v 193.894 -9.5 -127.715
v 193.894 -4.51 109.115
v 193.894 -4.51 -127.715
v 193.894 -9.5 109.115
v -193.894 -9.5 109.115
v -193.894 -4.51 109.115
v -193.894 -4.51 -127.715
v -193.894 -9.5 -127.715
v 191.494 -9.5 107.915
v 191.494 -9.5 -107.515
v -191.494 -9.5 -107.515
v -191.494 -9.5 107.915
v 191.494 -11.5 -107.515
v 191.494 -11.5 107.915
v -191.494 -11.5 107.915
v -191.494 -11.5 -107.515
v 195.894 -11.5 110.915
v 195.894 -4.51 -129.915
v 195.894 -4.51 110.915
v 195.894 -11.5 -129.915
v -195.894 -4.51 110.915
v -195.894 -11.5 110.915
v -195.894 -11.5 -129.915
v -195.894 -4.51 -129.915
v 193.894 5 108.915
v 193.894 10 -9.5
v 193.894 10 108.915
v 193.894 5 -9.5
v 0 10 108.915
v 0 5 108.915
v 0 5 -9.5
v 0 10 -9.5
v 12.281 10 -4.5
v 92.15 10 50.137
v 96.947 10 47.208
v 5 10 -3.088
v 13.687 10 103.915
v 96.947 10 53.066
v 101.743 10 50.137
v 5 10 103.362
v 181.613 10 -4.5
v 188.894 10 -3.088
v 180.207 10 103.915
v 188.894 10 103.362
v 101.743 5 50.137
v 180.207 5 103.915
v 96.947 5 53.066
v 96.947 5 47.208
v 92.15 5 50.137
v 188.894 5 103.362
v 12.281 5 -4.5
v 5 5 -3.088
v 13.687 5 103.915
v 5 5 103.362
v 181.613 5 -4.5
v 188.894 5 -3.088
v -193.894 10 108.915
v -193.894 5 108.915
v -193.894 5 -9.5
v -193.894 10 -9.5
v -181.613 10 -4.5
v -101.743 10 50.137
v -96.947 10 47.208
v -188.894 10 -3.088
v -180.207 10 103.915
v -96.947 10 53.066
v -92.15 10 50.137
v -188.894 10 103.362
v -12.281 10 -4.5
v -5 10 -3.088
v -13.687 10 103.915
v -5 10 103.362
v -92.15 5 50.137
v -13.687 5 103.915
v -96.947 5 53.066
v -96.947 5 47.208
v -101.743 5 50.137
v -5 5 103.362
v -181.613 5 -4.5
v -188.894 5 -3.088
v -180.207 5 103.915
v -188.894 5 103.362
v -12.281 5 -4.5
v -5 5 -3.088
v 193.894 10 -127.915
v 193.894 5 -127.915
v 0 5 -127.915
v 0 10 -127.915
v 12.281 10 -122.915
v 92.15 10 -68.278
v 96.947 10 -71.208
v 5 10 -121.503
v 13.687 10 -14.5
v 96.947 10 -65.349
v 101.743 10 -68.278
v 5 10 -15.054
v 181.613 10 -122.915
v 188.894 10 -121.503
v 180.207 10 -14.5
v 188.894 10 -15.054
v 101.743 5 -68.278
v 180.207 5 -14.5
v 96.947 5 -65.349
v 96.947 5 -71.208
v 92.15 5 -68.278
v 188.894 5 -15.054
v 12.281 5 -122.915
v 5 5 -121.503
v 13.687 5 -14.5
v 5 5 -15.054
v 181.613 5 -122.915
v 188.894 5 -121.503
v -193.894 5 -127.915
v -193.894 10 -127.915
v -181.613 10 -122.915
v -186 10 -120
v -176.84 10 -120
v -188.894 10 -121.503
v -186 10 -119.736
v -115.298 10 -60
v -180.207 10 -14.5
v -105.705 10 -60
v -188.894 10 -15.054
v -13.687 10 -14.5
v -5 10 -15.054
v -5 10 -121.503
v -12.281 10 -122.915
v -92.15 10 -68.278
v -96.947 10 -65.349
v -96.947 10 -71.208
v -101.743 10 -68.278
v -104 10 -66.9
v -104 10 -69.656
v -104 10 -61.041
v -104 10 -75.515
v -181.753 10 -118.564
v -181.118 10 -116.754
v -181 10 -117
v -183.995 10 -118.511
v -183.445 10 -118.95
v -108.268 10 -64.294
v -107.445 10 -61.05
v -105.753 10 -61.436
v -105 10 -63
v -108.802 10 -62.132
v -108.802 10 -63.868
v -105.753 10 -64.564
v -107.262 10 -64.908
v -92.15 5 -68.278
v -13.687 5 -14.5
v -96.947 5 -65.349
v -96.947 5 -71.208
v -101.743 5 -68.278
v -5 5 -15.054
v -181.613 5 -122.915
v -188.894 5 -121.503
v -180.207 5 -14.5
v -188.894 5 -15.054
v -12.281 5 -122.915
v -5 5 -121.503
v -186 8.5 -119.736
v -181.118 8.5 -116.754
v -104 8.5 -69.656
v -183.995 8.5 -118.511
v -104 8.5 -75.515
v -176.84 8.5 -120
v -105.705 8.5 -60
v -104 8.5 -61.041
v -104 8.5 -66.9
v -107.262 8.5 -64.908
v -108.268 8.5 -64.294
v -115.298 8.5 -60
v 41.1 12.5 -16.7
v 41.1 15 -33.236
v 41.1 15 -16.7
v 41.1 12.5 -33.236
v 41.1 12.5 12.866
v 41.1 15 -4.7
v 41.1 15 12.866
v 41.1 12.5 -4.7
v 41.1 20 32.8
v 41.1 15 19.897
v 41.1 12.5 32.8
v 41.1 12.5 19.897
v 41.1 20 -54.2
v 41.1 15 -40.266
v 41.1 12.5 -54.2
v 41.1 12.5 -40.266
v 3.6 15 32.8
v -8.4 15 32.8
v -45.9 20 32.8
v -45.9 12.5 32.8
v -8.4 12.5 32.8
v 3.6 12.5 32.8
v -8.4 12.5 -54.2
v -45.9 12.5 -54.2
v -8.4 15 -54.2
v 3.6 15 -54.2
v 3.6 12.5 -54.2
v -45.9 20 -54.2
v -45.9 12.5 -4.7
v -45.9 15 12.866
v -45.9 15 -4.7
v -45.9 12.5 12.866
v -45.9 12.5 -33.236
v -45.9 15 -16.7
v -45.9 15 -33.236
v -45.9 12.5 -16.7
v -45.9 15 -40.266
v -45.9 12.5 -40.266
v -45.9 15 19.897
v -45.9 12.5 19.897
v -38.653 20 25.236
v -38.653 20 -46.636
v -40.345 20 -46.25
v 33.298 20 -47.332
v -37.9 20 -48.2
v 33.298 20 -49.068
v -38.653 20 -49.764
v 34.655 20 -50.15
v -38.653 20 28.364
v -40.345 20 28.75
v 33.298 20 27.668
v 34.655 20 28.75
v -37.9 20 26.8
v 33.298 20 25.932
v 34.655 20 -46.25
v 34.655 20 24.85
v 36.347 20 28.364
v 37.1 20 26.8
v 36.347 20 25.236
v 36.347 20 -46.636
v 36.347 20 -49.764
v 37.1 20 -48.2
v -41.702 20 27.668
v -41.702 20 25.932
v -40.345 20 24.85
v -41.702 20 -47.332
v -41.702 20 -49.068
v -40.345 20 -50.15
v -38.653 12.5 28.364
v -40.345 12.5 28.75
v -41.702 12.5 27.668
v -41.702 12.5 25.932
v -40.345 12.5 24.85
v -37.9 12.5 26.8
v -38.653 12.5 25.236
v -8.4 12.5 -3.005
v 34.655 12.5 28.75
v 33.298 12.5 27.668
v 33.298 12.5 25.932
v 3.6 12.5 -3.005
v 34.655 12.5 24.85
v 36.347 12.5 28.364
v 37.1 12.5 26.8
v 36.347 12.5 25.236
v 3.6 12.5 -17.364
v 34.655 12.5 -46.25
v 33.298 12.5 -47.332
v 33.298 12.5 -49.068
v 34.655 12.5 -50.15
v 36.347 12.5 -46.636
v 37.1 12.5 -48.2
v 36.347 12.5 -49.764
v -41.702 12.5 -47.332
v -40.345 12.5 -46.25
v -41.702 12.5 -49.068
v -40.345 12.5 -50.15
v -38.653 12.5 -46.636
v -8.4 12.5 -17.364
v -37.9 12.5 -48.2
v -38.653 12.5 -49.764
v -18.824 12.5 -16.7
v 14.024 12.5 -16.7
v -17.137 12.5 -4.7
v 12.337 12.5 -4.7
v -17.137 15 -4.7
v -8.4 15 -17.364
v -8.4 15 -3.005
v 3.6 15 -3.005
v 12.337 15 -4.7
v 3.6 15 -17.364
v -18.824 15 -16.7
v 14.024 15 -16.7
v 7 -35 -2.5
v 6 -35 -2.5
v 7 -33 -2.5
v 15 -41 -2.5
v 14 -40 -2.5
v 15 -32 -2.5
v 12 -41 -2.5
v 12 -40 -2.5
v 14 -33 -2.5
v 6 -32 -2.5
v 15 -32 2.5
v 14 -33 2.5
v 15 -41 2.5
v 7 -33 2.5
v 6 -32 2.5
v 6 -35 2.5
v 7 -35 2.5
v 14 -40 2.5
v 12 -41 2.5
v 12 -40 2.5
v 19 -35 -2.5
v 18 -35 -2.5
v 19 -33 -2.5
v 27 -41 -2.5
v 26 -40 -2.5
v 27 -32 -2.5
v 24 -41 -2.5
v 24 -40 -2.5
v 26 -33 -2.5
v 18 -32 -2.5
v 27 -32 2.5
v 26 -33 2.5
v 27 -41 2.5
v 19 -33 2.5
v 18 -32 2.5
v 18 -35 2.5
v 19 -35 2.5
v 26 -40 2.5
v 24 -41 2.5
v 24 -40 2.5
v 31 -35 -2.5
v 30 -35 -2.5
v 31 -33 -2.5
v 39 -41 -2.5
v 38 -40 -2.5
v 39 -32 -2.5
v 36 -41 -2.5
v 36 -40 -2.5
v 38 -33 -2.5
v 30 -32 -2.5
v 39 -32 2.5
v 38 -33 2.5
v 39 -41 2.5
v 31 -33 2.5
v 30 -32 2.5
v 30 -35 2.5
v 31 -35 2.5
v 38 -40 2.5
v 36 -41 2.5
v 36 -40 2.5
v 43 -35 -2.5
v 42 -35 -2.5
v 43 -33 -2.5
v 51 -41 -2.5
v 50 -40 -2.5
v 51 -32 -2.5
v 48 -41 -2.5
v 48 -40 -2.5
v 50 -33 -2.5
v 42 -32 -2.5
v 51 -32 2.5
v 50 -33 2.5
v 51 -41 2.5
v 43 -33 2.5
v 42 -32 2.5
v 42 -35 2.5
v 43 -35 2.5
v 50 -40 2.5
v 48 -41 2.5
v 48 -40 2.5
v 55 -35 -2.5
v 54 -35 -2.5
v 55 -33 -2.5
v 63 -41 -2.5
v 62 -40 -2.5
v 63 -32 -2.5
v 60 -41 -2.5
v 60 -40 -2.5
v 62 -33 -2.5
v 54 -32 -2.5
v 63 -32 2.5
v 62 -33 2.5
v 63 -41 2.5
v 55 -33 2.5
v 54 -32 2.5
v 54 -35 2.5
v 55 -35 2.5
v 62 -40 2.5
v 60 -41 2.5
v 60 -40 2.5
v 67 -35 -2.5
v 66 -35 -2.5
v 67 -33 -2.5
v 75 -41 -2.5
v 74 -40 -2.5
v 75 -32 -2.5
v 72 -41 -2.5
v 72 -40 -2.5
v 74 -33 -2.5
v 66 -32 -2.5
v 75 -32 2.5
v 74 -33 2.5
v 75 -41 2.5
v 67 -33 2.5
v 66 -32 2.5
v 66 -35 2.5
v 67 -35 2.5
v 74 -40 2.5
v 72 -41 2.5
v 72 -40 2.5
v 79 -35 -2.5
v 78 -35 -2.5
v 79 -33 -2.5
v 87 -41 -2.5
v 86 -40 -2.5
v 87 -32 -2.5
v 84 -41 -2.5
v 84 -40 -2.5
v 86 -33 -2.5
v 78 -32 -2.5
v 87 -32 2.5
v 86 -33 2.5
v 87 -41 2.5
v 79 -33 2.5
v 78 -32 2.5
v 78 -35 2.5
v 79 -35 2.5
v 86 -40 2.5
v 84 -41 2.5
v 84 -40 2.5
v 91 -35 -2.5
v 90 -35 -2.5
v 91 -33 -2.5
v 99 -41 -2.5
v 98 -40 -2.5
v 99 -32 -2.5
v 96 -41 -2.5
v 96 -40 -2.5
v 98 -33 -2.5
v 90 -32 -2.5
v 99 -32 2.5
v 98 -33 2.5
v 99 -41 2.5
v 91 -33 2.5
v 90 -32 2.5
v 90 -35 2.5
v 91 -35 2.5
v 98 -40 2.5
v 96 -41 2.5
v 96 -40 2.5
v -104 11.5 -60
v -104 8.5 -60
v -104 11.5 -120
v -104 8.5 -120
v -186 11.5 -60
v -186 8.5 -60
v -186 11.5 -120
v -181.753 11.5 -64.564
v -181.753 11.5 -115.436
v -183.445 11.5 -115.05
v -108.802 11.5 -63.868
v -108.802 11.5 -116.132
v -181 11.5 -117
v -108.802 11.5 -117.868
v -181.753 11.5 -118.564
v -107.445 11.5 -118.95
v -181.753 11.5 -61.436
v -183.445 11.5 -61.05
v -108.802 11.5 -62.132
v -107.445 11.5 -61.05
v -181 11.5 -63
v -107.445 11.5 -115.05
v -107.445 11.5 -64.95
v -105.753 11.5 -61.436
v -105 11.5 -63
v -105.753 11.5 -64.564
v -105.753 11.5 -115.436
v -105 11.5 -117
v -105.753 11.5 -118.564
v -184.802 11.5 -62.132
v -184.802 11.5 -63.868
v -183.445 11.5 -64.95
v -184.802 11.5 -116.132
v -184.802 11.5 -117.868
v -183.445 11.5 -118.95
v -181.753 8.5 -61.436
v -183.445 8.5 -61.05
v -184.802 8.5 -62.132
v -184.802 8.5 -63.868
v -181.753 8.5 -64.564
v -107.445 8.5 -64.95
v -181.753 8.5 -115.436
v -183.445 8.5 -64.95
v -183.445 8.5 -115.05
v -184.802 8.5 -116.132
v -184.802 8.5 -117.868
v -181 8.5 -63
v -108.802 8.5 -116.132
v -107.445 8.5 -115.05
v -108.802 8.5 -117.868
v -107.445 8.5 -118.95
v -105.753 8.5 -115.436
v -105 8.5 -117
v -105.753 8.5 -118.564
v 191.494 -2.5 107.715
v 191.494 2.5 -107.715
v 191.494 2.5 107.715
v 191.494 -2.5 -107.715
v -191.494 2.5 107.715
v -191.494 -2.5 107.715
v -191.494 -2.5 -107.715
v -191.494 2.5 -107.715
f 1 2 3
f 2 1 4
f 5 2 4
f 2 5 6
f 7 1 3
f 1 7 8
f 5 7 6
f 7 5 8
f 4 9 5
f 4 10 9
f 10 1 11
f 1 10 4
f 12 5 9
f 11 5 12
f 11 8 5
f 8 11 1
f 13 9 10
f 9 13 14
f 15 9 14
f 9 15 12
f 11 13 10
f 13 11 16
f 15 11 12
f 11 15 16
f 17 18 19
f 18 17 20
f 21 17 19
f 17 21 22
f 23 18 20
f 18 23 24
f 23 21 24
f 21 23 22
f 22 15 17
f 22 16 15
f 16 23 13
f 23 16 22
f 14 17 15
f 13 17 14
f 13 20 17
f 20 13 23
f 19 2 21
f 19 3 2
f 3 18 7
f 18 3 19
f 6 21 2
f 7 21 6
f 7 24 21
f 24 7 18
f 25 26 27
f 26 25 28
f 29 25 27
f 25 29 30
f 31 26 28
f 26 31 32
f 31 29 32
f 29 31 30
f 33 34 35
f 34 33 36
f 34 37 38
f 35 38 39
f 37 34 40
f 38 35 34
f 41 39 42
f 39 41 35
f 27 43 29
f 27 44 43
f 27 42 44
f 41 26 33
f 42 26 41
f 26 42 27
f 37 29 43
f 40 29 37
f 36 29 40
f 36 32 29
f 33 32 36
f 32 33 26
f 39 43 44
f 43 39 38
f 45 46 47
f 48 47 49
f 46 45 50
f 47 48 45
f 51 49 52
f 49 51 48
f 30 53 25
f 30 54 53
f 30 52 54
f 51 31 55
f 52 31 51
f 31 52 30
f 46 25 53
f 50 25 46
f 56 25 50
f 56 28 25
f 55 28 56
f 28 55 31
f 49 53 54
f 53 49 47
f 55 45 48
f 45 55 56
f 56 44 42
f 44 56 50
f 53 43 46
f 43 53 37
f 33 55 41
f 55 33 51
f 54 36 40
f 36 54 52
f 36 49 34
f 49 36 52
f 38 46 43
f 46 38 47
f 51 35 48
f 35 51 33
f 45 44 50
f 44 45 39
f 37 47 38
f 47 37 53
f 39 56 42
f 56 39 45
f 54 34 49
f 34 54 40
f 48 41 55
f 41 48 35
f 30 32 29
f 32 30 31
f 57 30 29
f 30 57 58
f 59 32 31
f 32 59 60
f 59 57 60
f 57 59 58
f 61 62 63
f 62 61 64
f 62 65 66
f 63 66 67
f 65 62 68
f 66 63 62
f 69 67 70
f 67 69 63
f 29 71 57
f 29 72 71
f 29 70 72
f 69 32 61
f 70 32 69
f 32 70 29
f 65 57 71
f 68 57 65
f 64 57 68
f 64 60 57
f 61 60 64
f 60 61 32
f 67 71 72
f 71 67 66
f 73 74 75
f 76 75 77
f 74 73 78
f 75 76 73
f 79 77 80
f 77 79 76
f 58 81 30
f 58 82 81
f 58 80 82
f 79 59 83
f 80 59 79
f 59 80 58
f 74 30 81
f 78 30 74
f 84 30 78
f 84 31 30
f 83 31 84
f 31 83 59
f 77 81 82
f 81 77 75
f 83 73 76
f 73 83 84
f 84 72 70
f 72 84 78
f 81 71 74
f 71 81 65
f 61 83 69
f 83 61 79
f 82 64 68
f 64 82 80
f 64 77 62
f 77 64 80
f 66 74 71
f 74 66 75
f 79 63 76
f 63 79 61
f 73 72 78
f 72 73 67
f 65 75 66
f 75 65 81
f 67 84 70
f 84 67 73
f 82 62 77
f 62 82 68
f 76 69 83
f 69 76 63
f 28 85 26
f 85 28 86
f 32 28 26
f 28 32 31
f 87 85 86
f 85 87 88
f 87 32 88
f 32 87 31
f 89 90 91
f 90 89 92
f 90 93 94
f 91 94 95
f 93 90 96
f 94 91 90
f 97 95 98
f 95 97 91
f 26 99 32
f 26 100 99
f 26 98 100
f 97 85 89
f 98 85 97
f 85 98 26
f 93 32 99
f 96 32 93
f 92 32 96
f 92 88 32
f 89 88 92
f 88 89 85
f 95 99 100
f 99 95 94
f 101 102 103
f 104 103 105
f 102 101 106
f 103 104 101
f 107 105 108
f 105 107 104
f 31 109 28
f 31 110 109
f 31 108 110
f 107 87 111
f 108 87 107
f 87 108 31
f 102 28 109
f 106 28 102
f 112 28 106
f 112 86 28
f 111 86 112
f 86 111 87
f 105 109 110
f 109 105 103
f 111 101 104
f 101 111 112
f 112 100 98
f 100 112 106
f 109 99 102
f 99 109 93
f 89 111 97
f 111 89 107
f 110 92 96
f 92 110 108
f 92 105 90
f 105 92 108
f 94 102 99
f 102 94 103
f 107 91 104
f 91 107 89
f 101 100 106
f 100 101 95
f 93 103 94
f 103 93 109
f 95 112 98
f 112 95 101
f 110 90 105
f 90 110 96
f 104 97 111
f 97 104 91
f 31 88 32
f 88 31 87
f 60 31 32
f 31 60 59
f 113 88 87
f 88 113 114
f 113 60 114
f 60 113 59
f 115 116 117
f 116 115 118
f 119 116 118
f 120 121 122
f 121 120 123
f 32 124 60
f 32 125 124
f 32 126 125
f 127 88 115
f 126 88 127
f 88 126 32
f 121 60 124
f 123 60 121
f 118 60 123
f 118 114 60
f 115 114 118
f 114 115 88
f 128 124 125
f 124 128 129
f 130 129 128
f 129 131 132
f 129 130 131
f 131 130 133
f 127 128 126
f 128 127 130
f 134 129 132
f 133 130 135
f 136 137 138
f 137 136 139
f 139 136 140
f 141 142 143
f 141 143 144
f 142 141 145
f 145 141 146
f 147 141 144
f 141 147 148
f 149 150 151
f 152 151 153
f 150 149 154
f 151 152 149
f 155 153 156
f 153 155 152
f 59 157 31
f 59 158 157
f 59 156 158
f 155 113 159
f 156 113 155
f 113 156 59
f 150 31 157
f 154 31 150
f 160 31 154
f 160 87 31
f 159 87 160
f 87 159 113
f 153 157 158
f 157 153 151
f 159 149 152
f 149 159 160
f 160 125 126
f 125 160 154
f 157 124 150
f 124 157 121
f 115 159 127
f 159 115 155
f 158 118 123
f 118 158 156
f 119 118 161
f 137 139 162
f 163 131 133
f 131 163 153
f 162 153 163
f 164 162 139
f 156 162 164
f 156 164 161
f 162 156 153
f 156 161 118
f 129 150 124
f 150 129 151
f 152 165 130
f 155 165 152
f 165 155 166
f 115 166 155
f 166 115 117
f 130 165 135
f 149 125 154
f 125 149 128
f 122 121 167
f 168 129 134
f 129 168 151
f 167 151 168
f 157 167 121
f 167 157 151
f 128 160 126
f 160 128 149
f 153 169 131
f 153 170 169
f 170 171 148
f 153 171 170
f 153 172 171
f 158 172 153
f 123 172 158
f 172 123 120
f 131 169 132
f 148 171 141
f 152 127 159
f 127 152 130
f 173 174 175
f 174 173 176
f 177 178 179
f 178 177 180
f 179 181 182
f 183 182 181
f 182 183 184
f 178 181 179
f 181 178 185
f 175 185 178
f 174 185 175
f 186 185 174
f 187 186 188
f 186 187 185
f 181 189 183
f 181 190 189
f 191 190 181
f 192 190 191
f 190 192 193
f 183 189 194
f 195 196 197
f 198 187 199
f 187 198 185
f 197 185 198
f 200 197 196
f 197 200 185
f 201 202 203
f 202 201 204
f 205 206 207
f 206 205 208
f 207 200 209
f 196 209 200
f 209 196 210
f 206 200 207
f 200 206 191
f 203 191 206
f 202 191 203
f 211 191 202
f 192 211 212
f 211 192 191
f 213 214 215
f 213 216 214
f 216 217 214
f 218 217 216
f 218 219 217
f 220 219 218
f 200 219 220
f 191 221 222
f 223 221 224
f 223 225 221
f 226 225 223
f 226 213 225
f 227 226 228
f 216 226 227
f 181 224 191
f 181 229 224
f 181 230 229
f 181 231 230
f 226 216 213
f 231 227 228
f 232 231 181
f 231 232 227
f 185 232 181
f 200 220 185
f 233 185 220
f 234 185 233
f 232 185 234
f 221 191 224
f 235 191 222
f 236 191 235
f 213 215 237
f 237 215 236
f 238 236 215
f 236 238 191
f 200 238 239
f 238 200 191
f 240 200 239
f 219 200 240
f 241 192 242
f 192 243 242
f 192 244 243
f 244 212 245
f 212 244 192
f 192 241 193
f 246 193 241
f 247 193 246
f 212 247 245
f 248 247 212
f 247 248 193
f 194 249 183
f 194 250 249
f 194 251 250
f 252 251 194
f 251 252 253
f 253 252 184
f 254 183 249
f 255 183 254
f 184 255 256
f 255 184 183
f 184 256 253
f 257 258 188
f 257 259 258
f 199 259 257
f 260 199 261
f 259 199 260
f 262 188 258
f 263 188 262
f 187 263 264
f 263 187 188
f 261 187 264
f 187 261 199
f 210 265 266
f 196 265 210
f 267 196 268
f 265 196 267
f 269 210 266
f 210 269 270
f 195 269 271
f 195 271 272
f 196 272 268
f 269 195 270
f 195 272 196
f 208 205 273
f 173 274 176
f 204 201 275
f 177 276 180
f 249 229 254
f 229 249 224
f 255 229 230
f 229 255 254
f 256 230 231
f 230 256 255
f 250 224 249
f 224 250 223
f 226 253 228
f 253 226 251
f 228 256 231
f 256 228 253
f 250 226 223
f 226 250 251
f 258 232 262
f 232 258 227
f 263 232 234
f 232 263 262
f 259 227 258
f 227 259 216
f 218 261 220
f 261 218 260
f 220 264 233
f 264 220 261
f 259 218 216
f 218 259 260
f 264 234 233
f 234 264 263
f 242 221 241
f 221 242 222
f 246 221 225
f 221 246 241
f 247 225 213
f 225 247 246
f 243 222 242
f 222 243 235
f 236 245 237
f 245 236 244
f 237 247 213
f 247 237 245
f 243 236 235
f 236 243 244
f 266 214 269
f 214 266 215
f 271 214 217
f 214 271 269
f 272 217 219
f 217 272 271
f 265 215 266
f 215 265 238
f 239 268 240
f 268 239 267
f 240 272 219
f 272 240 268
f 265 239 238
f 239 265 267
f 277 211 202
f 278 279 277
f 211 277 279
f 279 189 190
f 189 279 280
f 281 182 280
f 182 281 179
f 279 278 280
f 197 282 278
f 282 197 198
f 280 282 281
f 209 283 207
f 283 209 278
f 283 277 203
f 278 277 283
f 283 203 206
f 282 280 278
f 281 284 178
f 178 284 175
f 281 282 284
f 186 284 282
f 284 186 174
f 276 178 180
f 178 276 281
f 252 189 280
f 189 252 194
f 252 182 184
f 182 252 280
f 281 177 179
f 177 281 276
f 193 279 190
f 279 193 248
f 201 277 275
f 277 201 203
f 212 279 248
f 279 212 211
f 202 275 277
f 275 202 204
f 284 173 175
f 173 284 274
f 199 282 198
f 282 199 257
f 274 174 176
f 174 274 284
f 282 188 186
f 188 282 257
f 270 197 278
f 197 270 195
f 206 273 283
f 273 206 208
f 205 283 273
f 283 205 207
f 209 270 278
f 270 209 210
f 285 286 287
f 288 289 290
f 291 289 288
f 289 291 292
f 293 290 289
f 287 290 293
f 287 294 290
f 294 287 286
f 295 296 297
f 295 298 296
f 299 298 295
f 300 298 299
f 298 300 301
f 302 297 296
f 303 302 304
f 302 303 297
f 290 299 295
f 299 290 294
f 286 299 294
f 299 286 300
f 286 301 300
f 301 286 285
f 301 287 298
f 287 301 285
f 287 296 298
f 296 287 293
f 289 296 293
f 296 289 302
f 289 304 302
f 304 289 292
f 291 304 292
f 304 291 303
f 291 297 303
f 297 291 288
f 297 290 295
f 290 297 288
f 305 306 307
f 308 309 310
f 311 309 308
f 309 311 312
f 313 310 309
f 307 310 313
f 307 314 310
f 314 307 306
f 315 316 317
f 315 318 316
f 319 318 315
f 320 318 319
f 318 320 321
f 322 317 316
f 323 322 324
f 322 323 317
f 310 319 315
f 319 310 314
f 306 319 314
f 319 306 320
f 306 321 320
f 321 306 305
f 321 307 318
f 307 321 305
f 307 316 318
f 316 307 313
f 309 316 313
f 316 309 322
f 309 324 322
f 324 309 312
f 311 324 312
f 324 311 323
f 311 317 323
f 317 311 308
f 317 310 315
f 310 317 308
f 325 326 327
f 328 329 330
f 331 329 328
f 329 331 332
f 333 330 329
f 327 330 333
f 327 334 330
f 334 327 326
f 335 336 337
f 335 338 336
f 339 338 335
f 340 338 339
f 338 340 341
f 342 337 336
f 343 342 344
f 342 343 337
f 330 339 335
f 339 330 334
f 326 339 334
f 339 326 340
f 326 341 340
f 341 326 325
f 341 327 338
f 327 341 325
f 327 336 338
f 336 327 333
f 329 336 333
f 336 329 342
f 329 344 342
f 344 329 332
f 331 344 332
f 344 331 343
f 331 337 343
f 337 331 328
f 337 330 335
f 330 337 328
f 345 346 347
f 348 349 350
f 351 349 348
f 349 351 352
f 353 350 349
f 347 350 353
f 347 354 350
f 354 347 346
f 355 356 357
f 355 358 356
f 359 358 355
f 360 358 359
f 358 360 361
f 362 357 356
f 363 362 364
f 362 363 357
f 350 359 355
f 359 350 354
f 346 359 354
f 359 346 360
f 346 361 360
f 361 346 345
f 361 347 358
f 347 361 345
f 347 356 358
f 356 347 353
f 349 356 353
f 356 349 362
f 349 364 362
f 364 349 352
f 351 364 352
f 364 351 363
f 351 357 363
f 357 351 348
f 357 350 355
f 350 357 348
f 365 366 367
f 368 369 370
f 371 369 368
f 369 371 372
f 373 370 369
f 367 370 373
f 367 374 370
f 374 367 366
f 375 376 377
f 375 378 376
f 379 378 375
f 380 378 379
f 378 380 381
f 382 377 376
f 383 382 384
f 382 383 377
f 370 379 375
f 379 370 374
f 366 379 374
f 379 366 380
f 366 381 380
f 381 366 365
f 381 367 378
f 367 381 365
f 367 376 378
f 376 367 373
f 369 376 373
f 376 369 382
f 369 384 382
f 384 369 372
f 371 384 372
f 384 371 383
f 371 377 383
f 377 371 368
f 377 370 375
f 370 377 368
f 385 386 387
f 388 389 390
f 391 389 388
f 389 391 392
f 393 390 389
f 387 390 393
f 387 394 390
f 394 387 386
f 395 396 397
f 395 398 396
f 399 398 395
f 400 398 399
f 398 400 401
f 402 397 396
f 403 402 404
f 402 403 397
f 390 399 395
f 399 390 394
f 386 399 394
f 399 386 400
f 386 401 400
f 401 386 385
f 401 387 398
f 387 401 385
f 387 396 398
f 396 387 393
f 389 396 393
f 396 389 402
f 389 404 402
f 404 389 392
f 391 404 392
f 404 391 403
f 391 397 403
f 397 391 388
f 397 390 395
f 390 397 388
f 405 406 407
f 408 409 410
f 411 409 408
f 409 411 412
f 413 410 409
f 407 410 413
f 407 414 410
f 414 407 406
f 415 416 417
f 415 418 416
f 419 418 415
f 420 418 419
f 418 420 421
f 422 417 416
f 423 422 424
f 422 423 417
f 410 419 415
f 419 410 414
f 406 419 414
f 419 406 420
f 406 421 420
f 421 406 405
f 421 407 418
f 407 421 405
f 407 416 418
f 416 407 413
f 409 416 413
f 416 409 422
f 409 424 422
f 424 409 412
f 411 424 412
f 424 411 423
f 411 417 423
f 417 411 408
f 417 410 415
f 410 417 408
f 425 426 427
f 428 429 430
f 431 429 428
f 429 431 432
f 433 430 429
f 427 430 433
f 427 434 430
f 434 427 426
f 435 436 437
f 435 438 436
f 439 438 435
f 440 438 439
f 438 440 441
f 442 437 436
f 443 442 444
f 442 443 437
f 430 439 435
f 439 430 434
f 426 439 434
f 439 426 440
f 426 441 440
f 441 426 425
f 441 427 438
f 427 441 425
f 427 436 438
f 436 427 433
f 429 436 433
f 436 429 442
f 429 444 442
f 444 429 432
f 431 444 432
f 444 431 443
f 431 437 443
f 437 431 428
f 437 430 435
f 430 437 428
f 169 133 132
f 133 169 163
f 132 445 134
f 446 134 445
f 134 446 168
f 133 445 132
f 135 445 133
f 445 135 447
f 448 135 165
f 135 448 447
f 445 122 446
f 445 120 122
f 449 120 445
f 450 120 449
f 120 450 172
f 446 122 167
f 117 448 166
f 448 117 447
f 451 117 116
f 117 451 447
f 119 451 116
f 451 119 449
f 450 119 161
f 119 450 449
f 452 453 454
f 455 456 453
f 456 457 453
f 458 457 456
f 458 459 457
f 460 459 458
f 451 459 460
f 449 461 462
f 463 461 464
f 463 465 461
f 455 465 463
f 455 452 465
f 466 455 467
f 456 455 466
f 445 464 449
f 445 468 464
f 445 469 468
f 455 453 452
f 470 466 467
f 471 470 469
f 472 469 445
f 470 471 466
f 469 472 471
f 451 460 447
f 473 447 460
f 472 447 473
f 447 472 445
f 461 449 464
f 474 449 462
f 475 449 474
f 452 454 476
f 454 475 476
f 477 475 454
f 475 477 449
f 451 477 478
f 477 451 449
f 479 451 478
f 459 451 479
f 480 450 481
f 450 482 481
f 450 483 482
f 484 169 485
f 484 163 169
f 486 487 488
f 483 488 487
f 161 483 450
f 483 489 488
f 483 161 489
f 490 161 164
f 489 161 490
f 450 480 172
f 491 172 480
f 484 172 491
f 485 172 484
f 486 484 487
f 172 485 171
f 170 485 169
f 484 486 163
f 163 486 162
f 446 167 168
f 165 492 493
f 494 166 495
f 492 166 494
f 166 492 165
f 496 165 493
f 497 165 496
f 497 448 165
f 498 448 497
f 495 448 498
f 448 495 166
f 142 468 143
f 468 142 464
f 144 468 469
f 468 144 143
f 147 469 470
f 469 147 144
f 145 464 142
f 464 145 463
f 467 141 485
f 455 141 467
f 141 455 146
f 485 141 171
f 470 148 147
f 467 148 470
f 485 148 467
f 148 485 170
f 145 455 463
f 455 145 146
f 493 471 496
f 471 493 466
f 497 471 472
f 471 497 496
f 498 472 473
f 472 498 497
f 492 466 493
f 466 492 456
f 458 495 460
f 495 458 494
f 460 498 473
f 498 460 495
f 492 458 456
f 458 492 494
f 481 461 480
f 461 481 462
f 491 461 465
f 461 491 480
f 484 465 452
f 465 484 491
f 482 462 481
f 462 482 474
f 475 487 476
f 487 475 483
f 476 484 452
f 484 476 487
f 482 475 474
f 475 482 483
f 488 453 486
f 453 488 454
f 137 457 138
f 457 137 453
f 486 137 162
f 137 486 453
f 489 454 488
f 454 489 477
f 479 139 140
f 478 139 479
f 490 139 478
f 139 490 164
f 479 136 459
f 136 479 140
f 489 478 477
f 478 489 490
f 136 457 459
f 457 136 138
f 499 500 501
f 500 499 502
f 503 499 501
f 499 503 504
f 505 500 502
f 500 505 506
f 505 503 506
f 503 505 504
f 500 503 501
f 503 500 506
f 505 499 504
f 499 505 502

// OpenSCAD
// file: ControlBoard.scad
module Board(
    width=82,
    height=60,
    hole_spacing_x=76,
    hole_spacing_y=54,
    hole_radius=2,
    thickness=3
) {
    difference() {
        cube(size=[width, thickness, height], center=true);

        translate([hole_spacing_x/2, 0, hole_spacing_y/2])
        rotate([90, 0, 0])
        cylinder(r=hole_radius, h=thickness * 2, center=true);

        translate([hole_spacing_x/2, 0, -hole_spacing_y/2])
        rotate([90, 0, 0])
        cylinder(r=hole_radius, h=thickness * 2, center=true);

        translate([-hole_spacing_x/2, 0, hole_spacing_y/2])
        rotate([90, 0, 0])
        cylinder(r=hole_radius, h=thickness * 2, center=true);

        translate([-hole_spacing_x/2, 0, -hole_spacing_y/2])
        rotate([90, 0, 0])
        cylinder(r=hole_radius, h=thickness * 2, center=true);
    }
}
// file: Clip.scad
module Clip(
    length=10,
    front_tab_size=2,
    back_width=4,
    back_tab_size=2,
    width=5,
    thickness=1
) {
    linear_extrude(height=5, center=true)
    polygon(
        points=[
            [0,0],[front_tab_size,0],[front_tab_size,length],[front_tab_size-back_width-thickness,length],[front_tab_size-back_width,length],[front_tab_size-back_width,length-back_tab_size],
            [front_tab_size-back_width-thickness,length-back_tab_size],[front_tab_size-back_width-thickness,length+thickness],[front_tab_size+thickness,length+thickness],[front_tab_size+thickness,0-thickness],[0,0-thickness]
        ], paths=[[0,1,2,3,4,5,6,7,8,9,10]]);

}
// file: Frame.scad
module Frame(
    monitor_width,
    monitor_height,
    panel_bezel_top,
    panel_bezel_left,
    panel_bezel_right,
    panel_bezel_bottom,
    monitor_depth,
    thickness
) {
    difference() {
        cube([
            monitor_width + panel_bezel_left + panel_bezel_right + thickness*2,
            monitor_depth + thickness*2,
            monitor_height + panel_bezel_top + panel_bezel_bottom + thickness*2
        ], center=true);
        translate([0, 0, (panel_bezel_top + panel_bezel_bottom)/2 - (thickness/2)]){
            translate([0, 0, -panel_bezel_bottom/2])
            cube([
                monitor_width + panel_bezel_left + panel_bezel_right,
                monitor_depth,
                monitor_height + panel_bezel_top + panel_bezel_bottom
            ], center=true);
            cube([
                monitor_width,
                monitor_depth * 2,
                monitor_height
            ], center=true);
        }
        translate([0, (monitor_depth+thickness-.01), 0])
        cube([
            monitor_width + panel_bezel_left + panel_bezel_right + thickness*2 + .01,
            monitor_depth + thickness*2,
            monitor_height + panel_bezel_top + panel_bezel_bottom + thickness*2 + .01
        ], center=true);
    }
}
// file: Backing.scad
// Units are in MM
module Backing(
    backing_plane_width,
    backing_plane_height,
    backing_offset=5,
    monitor_backing_split=2,
    monitor_backing_depth=5,
    monitor_cross_width=5,
    overlap=0
) {
    nothing = .01;
    // Recalc with offset
    backing_plane_diag = sqrt(backing_plane_width^2 + backing_plane_height^2);
    brace_angle = acos((backing_plane_diag^2 + backing_plane_width^2 - backing_plane_height^2) / (2 * backing_plane_diag * backing_plane_width));

    // Backing
    for (y=[1:monitor_backing_split]) {
        translate([0, 0, (y % monitor_backing_split)*(backing_plane_height/monitor_backing_split)]) {
        for (x=[1:monitor_backing_split]) {
            brace_width = backing_plane_width/monitor_backing_split;
            brace_height = backing_plane_height/monitor_backing_split;
            brace_size = backing_plane_diag/monitor_backing_split;
                translate([(x % monitor_backing_split)*(backing_plane_width/monitor_backing_split), 0, 0]){
                    // Border
                    difference() {
                        translate([-overlap/2, 0, -overlap/2])
                        cube([
                            brace_width + overlap,
                            monitor_backing_depth,
                            brace_height + overlap
                        ]);
                        translate([backing_offset + (overlap), -nothing, backing_offset + (overlap)])
                        cube([
                            brace_width - (backing_offset*2) - overlap*2,
                            monitor_backing_depth+nothing*2,
                            brace_height - (backing_offset*2) - overlap*2
                        ]);
                    }

                    // Crossbrace
                    difference(){
                        union(){
                            translate([0, 0, -(monitor_cross_width + overlap)/2])
                            rotate([0, -brace_angle, 0])
                                cube(size=[brace_size, monitor_backing_depth, monitor_cross_width + overlap]);
                            translate([0, 0, brace_height]){
                            translate([0, 0, -(monitor_cross_width + overlap)/2])
                            rotate([0, brace_angle, 0])
                                cube(size=[brace_size, monitor_backing_depth, monitor_cross_width + overlap]);
                            }
                        }
                        translate([0, -nothing, 0])
                        difference() {
                            translate([-backing_offset, -nothing, -backing_offset])
                            cube([
                                brace_width+backing_offset*2,
                                monitor_backing_depth*2,
                                brace_height+backing_offset*2
                            ]);
                            translate([-0, -monitor_backing_depth, -0])
                            cube([
                                brace_width,
                                monitor_backing_depth*4,
                                brace_height
                            ]);
                        }
                    }
                }
            }
        }
    }
}
// file: VESAMount.scad
module VESAMount(
    mount_border=5,
    mount_depth=5,
    hole_spacing_x=75,
    hole_spacing_y=75,
    hole_radius=4
) {
    difference() {
        cube([hole_spacing_x + hole_radius + (2 * mount_border), mount_depth, hole_spacing_y + hole_radius + (2 * mount_border)], center=true);

        translate([hole_spacing_x/2, 0, hole_spacing_y/2])
        rotate([90, 0, 0])
        cylinder(r=hole_radius, h=mount_depth * 2, center=true);

        translate([hole_spacing_x/2, 0, -hole_spacing_y/2])
        rotate([90, 0, 0])
        cylinder(r=hole_radius, h=mount_depth * 2, center=true);

        translate([-hole_spacing_x/2, 0, hole_spacing_y/2])
        rotate([90, 0, 0])
        cylinder(r=hole_radius, h=mount_depth * 2, center=true);

        translate([-hole_spacing_x/2, 0, -hole_spacing_y/2])
        rotate([90, 0, 0])
        cylinder(r=hole_radius, h=mount_depth * 2, center=true);
    }
}
// main file
include <VESAMount.scad>
include <Backing.scad>
include <Frame.scad>
include <Clip.scad>
include <ControlBoard.scad>

monitor_size = 439.42; // 17.3
monitor_depth = 5;
monitor_aspect_width = 16;
monitor_aspect_height = 9;
backing_offset = 5;
monitor_backing_split = 2;
monitor_backing_depth = 5;
monitor_cross_width = 5;
panel_bezel_top = 2.4;
panel_bezel_left = 2.4;
panel_bezel_right = 2.4;
panel_bezel_bottom = 19;
frame_thickness = 2;

monitor_aspect_diag = sqrt((monitor_aspect_width^2) + (monitor_aspect_height^2));
monitor_aspect_factor = monitor_size / monitor_aspect_diag;
monitor_width = monitor_aspect_width * monitor_aspect_factor;
monitor_height = monitor_aspect_height * monitor_aspect_factor;

echo(str("Size = ", monitor_width, "x", monitor_height));

vesa_mount_border = 5;
vesa_mount_depth = 7.5;
vesa_mount_overlap = 2.5;
vesa_hole_spacing_x = 75;
vesa_hole_spacing_y = 75;
vesa_hole_radius = 2;

cb_width = 82;
cb_height = 60;
cb_hole_spacing_x = 76;
cb_hole_spacing_y = 54;
cb_hole_radius = 2;
cb_thickness = 3;
cb_angle = acos((monitor_size^2 + monitor_width^2 - monitor_height^2) / (2 * monitor_size * monitor_width));

clip_count = 8;


// Panel
color([1,0,0])
cube([monitor_width, monitor_depth, monitor_height], center=true);


// Frame
translate([0, -7, -(panel_bezel_bottom)/2])
Frame(
    monitor_width,
    monitor_height,
    panel_bezel_top,
    panel_bezel_left,
    panel_bezel_right,
    panel_bezel_bottom,
    monitor_depth,
    frame_thickness
);


// Backing grid
translate([0, 5, -(monitor_height+panel_bezel_bottom)/2])
translate([-(monitor_width+panel_bezel_left+panel_bezel_right)/2, 0, -(panel_bezel_bottom+panel_bezel_top)/2])
Backing(
    monitor_width + panel_bezel_left + panel_bezel_right,
    monitor_height + panel_bezel_top + panel_bezel_bottom,
    backing_offset,
    monitor_backing_split,
    monitor_backing_depth,
    monitor_cross_width
);


// VESA Mount
translate([0, 10, -(monitor_height)/2])
translate([-(monitor_width+panel_bezel_left+panel_bezel_right)/2, 0, -(panel_bezel_bottom+panel_bezel_top)/2])
difference(){
    translate([monitor_width/2, monitor_backing_depth + (vesa_mount_depth/2) - vesa_mount_overlap, monitor_height/2])
    VESAMount(
        vesa_mount_border,
        vesa_mount_depth,
        vesa_hole_spacing_x,
        vesa_hole_spacing_y,
        vesa_hole_radius
    );
    translate([-panel_bezel_left, 0, -(panel_bezel_bottom+panel_bezel_top)/2])
    Backing(
        monitor_width + panel_bezel_left + panel_bezel_right,
        monitor_height + panel_bezel_top + panel_bezel_bottom,
        backing_offset,
        monitor_backing_split,
        monitor_backing_depth,
        monitor_cross_width,
        1
    );
}


// Clips
translate([0, -40, 0]) {
    for (i=[1:clip_count]) {
        translate([i*(frame_thickness+backing_offset+5), 0, 0])
        Clip(
            length=monitor_depth+frame_thickness,
            front_tab_size=2,
            back_width=frame_thickness+backing_offset,
            back_tab_size=2,
            width=5,
            thickness=1
        );
    }
}


// Control Board Backing
translate([-145, 10, -90])
Board(
    cb_width,
    cb_height,
    cb_hole_spacing_x,
    cb_hole_spacing_y,
    cb_hole_radius,
    cb_thickness,
    cb_angle
);
